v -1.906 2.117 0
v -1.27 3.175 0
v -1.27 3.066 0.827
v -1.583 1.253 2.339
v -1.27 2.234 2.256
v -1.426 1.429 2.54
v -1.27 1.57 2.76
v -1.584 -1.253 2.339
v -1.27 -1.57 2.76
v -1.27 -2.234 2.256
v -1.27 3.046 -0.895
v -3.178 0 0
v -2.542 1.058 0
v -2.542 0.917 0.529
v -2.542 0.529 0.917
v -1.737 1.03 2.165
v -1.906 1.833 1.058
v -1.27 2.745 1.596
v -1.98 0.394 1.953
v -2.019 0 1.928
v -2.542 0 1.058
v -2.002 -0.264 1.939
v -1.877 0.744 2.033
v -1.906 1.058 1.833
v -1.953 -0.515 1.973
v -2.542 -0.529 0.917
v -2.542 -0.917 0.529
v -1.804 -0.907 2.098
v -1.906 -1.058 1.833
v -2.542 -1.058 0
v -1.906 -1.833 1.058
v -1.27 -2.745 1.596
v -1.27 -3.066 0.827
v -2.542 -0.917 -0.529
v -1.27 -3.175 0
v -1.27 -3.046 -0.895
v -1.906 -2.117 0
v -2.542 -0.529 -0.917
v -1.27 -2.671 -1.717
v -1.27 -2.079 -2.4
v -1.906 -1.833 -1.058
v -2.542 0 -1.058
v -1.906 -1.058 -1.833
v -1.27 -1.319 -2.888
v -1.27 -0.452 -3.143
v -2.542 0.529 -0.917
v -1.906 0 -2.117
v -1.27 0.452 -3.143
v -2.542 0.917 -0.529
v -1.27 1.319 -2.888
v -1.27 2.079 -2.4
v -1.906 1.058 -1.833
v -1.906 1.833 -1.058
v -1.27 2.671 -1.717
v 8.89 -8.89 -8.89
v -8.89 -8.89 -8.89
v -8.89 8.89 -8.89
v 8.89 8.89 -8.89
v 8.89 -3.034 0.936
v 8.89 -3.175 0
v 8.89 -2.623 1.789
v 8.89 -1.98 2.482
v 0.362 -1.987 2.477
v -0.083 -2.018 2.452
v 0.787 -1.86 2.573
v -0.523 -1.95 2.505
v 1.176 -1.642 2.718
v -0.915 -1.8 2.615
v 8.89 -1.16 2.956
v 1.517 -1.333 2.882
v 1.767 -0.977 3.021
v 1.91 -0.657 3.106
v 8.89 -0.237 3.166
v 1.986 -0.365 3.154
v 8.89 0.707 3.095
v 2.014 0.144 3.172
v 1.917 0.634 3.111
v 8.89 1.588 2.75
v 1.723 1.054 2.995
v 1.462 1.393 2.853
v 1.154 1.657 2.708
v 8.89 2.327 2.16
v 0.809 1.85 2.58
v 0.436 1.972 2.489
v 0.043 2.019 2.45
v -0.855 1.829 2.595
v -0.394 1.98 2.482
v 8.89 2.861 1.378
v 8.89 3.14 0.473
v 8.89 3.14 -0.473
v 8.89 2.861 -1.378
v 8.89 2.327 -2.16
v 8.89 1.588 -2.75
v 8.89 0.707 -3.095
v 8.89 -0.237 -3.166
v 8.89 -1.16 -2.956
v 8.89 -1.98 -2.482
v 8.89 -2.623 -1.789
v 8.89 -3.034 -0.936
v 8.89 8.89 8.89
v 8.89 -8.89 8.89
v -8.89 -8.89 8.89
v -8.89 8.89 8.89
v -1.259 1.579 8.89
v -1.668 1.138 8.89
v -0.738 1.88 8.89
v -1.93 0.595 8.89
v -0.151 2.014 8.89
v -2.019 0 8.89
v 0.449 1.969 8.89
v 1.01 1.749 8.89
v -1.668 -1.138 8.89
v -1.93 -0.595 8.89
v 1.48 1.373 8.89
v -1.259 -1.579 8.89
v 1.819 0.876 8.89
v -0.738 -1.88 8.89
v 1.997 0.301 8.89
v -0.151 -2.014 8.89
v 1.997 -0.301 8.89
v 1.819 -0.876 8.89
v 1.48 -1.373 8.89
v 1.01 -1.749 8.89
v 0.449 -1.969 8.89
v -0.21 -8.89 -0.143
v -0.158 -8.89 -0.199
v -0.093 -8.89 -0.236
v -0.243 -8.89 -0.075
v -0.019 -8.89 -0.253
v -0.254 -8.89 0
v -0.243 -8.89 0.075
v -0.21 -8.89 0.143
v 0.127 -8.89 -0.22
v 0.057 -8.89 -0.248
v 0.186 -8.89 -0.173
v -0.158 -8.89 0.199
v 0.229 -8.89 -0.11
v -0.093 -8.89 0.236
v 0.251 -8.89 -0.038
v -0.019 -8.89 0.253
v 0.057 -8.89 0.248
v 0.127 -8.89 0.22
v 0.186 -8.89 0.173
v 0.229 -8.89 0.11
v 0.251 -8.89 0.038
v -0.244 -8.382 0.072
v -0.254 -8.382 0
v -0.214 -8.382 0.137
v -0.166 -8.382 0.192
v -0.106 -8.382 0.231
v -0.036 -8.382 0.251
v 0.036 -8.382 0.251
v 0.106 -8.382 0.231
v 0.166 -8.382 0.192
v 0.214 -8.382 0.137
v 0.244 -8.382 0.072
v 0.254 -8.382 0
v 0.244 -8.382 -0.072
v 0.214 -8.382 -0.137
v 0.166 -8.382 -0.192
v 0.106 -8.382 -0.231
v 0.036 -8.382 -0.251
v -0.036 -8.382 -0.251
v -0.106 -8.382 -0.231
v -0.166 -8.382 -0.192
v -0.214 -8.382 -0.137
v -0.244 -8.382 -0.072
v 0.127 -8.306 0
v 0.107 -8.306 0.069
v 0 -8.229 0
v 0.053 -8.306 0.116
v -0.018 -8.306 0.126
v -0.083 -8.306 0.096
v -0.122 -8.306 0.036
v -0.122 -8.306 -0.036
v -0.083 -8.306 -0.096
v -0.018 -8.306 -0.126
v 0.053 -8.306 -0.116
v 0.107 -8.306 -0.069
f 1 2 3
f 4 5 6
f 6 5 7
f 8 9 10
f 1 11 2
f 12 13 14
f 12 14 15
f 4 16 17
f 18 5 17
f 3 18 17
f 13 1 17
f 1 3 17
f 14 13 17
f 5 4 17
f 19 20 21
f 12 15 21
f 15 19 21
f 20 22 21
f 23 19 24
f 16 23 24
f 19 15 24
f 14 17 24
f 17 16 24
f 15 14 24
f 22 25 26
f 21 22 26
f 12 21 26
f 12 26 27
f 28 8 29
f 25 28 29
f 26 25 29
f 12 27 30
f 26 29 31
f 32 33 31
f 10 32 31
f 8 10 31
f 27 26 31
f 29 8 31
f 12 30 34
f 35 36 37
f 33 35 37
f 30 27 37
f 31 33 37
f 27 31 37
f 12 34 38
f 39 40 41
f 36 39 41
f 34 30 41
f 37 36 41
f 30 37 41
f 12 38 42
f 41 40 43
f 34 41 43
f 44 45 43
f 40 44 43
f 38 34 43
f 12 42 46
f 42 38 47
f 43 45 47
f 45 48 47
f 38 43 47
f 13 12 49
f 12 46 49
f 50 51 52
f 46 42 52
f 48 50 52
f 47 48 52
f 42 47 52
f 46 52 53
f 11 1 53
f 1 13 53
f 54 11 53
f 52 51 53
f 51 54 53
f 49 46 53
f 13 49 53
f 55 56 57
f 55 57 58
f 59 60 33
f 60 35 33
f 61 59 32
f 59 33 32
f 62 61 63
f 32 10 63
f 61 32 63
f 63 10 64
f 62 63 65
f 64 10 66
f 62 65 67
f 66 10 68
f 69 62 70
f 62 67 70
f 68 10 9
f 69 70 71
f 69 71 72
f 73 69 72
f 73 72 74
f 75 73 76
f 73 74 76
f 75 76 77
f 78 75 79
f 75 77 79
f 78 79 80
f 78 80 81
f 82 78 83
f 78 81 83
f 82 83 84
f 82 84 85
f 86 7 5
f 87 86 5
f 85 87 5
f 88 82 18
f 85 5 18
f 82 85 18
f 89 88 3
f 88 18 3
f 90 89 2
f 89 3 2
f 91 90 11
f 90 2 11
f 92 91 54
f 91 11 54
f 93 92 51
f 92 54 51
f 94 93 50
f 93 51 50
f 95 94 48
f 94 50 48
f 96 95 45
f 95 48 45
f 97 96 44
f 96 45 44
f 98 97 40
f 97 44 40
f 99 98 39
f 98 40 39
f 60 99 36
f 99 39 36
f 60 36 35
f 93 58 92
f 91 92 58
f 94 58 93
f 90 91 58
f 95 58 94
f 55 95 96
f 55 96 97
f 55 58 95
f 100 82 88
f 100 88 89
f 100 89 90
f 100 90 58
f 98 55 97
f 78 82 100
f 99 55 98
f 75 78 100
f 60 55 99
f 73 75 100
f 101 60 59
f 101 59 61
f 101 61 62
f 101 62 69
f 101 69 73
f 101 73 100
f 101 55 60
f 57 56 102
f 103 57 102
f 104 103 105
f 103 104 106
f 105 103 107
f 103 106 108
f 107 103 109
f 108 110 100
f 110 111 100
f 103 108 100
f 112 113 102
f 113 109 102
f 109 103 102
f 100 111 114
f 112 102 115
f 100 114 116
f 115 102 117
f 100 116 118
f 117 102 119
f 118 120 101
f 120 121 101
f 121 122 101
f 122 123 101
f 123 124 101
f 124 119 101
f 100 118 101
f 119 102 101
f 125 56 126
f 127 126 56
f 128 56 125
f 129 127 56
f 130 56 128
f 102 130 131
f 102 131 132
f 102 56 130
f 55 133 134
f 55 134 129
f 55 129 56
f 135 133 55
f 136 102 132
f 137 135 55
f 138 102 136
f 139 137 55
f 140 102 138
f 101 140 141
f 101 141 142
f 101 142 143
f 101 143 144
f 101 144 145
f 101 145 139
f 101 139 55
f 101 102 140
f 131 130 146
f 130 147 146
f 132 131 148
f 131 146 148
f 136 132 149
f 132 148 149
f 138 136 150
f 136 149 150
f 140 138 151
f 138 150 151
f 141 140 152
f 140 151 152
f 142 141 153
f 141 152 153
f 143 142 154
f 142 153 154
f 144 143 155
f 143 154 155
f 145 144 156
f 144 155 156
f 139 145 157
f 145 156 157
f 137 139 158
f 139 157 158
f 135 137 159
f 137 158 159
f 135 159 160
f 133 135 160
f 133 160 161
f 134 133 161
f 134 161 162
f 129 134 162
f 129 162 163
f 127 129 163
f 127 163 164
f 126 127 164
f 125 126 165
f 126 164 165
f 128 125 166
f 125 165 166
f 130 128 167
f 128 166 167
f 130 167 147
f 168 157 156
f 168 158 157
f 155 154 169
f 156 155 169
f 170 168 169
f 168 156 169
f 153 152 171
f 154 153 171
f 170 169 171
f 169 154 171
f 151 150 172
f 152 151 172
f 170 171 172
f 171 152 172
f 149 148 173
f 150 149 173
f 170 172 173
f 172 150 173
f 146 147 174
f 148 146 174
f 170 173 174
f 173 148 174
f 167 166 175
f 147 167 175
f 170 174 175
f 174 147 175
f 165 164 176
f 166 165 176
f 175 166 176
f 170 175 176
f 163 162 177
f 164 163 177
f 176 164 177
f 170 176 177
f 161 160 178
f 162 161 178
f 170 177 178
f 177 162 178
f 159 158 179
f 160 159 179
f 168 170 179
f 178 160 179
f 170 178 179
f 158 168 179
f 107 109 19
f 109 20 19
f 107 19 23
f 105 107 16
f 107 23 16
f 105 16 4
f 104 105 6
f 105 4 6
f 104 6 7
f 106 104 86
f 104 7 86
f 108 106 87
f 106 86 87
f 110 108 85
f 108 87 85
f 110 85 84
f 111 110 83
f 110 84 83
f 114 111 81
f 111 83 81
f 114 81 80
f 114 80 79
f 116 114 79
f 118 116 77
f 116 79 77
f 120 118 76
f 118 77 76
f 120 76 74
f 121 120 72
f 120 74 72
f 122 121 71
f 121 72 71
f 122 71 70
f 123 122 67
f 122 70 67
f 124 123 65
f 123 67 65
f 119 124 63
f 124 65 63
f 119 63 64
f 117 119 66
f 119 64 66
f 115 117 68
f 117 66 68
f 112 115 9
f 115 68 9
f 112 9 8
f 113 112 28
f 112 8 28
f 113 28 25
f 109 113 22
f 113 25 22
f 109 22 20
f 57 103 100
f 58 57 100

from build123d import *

# Parameters (mm, degrees)
F0_W     = 17.78
F0_H     = 17.78
F1_DEPTH = 8.89
F5_D     = 0.508
F5_DEPTH = 0.508
F5_TIP   = 0.1526185972
F6_D     = 4.0386
F6_DEPTH = 10.16
F6_TIP   = 1.213317848
F7_D     = 6.35
F7_DEPTH = 10.16
F7_TIP   = 1.9077324654


with BuildPart() as f1:
    # F0 (on Front) → F1 (new body, symmetric)
    with BuildSketch(Plane.XZ):
        Rectangle(F0_W, F0_H)
    extrude(amount=F1_DEPTH, both=True)

    # F5
    with Locations(Plane.XZ.offset(8.89)):
        with Locations((0, 0)):
            Hole(F5_D / 2, depth=F5_DEPTH)
            with Locations((0, 0, -(F5_DEPTH + F5_TIP / 2))):  # 118° drill point
                Cone(0, F5_D / 2, F5_TIP, mode=Mode.SUBTRACT)

    # F6
    with Locations(Plane.XY.offset(8.89)):
        with Locations((0, 0)):
            Hole(F6_D / 2, depth=F6_DEPTH)
            with Locations((0, 0, -(F6_DEPTH + F6_TIP / 2))):  # 118° drill point
                Cone(0, F6_D / 2, F6_TIP, mode=Mode.SUBTRACT)

    # F7
    with Locations(Plane.YZ.offset(8.89)):
        with Locations((0, 0)):
            Hole(F7_D / 2, depth=F7_DEPTH)
            with Locations((0, 0, -(F7_DEPTH + F7_TIP / 2))):  # 118° drill point
                Cone(0, F7_D / 2, F7_TIP, mode=Mode.SUBTRACT)


solid = f1.part
